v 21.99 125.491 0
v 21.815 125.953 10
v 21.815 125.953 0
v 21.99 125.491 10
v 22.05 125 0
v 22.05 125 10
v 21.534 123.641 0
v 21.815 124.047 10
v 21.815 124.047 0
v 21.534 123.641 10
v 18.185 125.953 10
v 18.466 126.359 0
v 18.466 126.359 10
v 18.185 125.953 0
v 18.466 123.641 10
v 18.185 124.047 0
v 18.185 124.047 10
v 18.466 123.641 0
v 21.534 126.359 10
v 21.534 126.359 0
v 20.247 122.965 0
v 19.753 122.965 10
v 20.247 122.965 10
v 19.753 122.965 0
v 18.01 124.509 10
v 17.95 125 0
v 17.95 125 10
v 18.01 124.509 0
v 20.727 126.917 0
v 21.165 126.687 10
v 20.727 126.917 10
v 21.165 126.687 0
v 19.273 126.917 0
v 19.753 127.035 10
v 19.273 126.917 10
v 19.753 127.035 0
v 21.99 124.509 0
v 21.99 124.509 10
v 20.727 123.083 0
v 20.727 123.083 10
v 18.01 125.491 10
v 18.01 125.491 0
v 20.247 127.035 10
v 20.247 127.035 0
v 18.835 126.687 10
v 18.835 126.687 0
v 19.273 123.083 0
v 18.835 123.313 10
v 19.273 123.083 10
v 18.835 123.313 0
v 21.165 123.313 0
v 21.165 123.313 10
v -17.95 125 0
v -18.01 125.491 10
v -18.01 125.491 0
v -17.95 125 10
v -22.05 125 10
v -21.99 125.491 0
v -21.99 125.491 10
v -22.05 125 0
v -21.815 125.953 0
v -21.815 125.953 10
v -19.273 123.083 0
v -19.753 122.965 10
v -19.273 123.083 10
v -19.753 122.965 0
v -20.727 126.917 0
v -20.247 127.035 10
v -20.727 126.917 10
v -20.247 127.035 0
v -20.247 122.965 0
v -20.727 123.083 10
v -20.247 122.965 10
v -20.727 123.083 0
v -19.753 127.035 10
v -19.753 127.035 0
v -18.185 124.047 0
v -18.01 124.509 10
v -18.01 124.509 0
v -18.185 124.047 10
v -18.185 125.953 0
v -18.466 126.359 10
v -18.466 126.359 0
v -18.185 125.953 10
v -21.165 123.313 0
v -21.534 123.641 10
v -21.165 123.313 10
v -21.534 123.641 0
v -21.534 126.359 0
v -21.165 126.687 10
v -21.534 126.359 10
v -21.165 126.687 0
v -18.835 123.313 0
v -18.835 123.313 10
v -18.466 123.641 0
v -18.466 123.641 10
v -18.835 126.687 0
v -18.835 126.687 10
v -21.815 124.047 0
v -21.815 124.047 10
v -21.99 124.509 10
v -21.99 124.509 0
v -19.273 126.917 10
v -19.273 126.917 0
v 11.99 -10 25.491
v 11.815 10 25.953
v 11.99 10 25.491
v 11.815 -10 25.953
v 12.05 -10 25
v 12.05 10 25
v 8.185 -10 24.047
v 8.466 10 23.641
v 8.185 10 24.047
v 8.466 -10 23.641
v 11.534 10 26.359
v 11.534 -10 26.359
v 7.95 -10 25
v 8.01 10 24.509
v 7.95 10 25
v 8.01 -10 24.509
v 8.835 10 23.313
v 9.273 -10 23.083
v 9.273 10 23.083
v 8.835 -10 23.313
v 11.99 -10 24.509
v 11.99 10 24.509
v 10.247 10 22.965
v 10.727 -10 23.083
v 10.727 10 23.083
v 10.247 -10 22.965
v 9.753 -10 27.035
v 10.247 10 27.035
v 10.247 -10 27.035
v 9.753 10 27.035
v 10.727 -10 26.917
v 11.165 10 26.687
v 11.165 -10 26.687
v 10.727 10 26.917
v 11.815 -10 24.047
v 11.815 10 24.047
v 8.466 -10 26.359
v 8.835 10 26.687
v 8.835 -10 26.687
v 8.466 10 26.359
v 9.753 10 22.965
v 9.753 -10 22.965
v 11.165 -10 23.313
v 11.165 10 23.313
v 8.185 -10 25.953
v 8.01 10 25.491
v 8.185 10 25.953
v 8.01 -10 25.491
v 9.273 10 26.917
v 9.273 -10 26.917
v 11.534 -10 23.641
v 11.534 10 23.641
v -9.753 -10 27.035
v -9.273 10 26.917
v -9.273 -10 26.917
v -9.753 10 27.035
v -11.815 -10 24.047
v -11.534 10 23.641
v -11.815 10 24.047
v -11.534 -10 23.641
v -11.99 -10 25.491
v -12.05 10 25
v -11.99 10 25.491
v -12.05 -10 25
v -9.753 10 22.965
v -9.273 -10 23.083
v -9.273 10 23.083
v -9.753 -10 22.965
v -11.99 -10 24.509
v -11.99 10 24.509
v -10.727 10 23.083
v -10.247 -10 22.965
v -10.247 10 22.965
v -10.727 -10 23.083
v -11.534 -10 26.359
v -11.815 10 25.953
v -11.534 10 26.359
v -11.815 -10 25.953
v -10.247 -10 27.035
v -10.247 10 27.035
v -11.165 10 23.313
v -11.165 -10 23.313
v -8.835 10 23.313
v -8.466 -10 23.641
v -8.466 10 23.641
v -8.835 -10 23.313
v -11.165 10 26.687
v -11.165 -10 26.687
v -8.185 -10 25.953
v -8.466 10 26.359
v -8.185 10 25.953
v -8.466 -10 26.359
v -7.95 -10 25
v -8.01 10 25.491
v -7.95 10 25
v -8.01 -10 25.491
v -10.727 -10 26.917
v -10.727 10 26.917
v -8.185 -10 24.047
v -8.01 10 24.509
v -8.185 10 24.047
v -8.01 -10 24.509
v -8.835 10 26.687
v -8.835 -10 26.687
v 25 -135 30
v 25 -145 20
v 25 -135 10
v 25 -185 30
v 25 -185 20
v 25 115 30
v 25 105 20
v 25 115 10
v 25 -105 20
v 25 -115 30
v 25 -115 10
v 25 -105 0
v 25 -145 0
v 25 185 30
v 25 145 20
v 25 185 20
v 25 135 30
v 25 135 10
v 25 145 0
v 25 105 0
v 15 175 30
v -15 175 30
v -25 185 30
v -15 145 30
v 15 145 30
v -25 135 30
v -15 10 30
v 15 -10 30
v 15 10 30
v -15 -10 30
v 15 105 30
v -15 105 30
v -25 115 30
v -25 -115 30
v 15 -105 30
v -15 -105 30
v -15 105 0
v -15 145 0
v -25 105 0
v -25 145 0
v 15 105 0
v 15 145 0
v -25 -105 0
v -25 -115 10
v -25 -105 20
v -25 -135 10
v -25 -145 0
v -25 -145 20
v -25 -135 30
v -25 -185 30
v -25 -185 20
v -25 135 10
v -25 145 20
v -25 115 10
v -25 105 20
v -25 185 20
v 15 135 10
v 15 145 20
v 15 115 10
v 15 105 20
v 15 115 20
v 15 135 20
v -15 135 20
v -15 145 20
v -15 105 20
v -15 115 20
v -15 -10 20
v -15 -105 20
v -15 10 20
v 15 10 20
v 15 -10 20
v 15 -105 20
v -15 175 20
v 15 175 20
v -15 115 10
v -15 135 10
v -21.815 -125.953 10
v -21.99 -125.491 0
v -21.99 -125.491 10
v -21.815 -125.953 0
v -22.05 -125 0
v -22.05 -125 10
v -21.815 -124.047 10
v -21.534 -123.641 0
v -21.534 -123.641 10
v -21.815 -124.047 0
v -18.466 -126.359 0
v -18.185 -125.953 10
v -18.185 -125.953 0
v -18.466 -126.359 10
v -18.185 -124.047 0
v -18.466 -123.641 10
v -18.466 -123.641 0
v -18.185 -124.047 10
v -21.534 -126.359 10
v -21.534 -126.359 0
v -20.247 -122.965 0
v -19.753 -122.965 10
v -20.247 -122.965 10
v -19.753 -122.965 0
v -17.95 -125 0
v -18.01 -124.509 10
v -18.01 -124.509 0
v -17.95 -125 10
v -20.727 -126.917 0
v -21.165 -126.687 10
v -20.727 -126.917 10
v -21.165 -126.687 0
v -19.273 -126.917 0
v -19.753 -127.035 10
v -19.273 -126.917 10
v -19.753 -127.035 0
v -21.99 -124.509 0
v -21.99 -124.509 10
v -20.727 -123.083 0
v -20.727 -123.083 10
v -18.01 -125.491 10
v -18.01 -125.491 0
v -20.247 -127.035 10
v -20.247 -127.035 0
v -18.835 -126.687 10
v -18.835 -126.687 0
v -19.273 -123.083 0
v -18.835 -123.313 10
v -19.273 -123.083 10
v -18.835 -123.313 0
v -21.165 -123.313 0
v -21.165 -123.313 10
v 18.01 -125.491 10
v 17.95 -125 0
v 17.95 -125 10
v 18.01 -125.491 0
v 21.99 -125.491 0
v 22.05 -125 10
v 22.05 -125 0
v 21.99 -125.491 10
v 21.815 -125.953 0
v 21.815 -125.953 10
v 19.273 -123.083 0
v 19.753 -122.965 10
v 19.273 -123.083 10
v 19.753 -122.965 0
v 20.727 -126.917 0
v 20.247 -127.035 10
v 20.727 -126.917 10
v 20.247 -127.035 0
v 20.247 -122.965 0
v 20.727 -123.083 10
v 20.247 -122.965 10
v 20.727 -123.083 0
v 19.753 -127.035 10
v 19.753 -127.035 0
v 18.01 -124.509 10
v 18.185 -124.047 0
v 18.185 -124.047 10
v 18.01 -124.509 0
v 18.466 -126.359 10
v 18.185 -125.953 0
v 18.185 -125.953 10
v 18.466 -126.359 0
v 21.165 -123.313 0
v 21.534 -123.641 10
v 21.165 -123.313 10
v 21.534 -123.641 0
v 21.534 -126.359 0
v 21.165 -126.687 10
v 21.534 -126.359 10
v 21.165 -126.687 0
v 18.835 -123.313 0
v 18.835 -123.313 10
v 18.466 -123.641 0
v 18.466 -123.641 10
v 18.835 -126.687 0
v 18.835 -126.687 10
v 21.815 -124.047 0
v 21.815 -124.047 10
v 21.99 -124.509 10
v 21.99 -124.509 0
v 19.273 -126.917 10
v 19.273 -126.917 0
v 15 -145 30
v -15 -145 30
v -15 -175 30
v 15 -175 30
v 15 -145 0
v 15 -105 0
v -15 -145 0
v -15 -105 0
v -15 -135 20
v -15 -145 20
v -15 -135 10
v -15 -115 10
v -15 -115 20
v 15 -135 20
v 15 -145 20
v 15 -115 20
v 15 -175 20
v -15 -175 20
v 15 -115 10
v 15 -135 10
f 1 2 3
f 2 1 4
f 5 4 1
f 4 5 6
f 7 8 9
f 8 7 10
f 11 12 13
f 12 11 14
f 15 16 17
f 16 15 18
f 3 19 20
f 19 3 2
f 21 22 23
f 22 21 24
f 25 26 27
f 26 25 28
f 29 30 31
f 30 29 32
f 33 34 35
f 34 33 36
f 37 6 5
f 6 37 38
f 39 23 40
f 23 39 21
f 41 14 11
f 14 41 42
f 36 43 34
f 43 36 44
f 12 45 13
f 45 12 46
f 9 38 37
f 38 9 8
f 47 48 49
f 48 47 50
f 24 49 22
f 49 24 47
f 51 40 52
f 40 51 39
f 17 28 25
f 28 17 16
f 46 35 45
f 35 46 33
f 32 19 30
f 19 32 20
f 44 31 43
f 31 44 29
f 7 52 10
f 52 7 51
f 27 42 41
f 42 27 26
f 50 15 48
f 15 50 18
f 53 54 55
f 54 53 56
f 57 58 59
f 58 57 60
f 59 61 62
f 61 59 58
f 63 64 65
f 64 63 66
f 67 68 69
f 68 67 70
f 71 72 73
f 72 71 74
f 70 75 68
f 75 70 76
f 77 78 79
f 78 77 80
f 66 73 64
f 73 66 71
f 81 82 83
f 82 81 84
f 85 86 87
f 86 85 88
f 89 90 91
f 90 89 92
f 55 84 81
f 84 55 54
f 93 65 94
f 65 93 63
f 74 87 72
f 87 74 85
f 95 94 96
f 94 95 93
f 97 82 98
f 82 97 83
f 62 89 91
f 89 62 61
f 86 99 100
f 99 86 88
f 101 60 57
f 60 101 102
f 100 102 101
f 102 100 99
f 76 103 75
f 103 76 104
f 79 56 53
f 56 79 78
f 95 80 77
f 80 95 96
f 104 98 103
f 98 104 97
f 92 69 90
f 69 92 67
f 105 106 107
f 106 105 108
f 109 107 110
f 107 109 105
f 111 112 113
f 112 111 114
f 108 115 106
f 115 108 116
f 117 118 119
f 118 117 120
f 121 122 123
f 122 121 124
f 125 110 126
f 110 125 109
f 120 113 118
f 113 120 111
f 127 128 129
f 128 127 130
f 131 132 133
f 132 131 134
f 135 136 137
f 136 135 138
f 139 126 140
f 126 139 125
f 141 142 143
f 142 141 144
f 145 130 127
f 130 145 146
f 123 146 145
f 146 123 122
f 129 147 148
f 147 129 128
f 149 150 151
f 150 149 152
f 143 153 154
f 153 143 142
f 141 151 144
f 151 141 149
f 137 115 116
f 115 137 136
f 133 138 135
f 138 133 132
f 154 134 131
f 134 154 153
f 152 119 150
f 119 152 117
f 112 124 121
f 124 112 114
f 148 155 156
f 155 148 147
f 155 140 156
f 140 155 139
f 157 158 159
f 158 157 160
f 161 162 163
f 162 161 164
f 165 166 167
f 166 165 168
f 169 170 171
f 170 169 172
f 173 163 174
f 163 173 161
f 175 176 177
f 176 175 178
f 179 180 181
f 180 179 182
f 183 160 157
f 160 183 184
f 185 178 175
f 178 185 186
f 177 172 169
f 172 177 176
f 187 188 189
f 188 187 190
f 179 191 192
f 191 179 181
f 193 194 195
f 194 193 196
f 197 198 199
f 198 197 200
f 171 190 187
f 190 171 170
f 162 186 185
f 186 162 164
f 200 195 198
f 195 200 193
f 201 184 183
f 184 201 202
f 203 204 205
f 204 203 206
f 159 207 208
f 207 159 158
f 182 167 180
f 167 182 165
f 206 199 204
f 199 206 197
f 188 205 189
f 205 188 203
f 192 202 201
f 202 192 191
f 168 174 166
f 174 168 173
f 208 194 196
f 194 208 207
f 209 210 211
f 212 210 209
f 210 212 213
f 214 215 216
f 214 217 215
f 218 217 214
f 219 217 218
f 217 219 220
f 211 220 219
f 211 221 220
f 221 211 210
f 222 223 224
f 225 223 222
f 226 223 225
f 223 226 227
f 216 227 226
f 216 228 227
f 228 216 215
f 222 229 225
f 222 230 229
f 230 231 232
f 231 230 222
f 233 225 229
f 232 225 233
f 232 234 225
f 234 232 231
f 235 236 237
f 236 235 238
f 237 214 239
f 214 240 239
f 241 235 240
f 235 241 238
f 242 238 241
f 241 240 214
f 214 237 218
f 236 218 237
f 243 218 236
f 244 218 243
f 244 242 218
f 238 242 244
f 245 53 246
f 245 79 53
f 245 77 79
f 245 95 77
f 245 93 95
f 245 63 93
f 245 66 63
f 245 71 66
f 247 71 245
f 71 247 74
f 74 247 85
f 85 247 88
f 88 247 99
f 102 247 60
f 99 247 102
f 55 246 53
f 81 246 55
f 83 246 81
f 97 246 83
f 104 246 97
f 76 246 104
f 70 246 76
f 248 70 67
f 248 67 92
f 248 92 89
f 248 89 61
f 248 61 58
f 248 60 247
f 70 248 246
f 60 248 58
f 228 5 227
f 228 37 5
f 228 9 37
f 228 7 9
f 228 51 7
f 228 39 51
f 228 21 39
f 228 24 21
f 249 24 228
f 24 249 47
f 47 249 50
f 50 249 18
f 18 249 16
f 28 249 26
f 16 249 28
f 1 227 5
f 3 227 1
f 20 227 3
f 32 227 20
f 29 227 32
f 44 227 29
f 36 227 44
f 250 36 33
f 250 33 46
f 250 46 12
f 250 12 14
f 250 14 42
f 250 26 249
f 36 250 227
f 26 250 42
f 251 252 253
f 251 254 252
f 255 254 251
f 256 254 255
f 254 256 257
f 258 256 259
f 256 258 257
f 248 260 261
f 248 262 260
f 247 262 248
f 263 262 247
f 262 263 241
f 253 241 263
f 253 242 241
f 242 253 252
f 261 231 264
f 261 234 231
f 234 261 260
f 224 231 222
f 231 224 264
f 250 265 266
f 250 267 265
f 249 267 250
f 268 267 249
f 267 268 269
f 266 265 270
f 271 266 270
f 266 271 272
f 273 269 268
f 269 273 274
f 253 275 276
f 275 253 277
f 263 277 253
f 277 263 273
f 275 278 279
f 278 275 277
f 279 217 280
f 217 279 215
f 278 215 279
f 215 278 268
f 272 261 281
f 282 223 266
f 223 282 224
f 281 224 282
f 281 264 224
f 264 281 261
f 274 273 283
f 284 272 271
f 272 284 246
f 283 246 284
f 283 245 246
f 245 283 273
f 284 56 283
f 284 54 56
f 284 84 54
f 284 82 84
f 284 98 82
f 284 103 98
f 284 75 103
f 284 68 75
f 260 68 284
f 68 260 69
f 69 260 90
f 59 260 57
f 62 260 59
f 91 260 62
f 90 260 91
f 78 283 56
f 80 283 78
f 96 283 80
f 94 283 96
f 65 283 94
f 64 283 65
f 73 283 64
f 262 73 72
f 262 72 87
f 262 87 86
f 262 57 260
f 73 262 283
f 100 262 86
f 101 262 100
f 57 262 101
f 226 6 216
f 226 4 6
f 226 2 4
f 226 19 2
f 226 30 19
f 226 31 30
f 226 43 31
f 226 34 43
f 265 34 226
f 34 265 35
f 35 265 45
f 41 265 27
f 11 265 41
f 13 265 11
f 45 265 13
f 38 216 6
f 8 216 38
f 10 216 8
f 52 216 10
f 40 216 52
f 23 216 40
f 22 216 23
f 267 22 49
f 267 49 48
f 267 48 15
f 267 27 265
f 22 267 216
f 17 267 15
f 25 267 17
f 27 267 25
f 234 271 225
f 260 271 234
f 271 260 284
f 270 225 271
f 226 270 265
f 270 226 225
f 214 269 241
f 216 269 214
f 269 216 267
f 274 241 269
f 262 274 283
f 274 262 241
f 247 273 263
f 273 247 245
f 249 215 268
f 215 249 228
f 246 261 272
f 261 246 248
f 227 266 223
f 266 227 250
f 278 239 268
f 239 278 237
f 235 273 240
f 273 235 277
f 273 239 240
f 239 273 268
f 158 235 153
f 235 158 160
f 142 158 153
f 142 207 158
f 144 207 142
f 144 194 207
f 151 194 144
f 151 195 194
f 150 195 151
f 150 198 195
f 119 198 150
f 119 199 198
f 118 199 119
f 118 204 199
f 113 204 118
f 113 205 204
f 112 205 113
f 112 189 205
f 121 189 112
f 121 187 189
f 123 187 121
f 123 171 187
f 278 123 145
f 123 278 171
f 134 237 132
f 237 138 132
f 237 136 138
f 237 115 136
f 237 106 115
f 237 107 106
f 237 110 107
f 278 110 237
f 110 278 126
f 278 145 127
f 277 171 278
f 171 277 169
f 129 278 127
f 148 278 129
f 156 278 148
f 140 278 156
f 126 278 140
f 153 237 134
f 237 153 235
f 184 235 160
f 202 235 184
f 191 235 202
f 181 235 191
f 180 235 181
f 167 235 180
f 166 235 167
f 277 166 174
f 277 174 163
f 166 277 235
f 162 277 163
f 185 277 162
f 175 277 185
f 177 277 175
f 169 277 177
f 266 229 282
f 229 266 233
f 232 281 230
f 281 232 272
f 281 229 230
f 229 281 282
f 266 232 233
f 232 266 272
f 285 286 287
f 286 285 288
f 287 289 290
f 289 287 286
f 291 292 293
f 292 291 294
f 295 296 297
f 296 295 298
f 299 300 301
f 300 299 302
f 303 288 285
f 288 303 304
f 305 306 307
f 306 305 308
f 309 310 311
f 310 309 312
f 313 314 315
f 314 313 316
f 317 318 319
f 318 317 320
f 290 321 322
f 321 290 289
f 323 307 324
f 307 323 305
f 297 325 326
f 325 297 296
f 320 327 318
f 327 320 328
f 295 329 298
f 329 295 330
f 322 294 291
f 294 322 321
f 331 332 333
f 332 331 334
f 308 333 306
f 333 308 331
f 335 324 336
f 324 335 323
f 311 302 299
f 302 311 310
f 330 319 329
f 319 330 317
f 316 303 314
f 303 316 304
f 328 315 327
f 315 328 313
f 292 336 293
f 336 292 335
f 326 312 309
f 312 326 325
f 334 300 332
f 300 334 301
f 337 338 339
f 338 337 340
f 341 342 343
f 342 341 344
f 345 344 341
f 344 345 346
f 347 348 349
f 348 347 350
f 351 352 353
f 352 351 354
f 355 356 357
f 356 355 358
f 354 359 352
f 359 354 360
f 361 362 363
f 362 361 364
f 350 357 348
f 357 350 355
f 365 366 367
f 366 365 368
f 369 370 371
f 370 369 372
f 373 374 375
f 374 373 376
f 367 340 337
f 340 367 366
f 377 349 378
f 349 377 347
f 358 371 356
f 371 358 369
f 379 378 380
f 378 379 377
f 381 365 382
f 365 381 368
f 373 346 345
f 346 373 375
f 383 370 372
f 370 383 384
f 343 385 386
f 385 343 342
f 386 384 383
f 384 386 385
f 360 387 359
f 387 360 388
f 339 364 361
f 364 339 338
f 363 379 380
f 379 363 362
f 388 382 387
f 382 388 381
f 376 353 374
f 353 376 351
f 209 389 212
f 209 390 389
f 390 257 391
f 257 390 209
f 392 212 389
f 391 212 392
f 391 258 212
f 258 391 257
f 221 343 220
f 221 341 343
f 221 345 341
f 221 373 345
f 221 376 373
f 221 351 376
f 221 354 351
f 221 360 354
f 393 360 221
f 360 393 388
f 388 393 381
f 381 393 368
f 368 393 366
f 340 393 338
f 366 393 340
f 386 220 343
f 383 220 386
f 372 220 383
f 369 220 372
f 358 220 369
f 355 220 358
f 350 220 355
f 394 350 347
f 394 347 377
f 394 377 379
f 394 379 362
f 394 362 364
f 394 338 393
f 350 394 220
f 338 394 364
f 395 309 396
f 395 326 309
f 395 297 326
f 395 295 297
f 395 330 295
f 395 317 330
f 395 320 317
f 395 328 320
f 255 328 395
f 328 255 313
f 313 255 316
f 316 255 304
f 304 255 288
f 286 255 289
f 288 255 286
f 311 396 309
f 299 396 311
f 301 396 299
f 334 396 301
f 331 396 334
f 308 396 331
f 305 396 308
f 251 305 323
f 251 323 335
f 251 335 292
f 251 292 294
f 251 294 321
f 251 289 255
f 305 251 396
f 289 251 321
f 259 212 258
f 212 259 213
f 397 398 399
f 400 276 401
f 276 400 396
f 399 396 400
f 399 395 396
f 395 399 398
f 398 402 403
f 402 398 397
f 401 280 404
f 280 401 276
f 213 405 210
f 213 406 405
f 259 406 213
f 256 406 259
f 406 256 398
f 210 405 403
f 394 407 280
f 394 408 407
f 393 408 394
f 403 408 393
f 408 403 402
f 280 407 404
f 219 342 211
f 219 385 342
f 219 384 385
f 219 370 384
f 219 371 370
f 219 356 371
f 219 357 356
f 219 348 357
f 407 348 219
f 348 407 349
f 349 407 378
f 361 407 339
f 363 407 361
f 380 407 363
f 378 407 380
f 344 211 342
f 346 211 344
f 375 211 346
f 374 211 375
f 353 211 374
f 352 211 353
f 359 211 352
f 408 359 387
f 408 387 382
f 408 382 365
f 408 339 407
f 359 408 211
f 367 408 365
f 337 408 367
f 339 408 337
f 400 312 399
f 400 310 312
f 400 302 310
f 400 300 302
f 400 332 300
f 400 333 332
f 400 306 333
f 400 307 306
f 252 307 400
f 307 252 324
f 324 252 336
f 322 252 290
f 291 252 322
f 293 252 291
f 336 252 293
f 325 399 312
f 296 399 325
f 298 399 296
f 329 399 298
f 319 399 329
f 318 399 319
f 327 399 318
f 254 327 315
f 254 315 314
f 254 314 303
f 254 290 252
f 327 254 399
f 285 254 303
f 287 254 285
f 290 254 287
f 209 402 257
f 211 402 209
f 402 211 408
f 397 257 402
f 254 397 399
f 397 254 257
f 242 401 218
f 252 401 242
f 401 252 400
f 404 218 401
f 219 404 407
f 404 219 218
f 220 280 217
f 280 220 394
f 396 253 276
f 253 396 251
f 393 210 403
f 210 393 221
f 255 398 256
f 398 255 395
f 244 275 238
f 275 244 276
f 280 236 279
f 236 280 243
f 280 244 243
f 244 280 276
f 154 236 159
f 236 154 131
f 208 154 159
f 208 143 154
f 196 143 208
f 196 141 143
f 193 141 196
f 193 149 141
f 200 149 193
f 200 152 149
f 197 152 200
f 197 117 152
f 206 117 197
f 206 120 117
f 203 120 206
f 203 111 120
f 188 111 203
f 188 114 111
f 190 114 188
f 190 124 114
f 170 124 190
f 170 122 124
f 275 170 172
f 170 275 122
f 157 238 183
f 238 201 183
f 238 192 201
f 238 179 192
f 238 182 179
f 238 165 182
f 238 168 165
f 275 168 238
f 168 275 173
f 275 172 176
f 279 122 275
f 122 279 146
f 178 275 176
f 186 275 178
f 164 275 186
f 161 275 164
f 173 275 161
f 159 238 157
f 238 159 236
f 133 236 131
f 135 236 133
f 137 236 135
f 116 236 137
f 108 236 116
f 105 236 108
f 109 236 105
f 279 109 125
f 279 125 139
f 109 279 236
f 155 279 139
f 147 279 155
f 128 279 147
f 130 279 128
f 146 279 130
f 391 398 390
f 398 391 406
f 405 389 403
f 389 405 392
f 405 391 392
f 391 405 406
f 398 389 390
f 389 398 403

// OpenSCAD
// file: copy.scad
// this file defines various copy functions


// this function copies his children and rotates the copies

// v: rotation vector
// n: number of copies
// center: rotate on both sides equally
module rotateCopy(v = [0,0,0], n = 1, center = false)
{
  // calculate rotation offset if center is true
  rotationOffset = -n*v/2;
  
  // copy rotate
  for (i = [0:n])
  {
    if (center)
    {
      rotate(i*v + rotationOffset) children();
    }
    else
    { 
      rotate(i*v) children();
    }
  }
}


// this function copies his children and translates the copies

// v: translation vector
// n: number of copies
// center: translate on both sides equally
module translateCopy(v = [0,0,0], n = 1, center = false)
{
  // calculate translation offset if center is true
  translationOffset = -n*v/2;
  
  // copy and translate
  for (i = [0:n])
  {
    if (center) 
    {
      translate(i*v + start) children();
    }
    else 
    {
      translate(i*v) children();
    }
  }
}


// this function copies his children and mirrors the copy

// v: mirror vector
module mirrorCopy(v = [1,0,0])
{
  children();
  mirror(v) children();
}


// this function copies his children in a grid
// translation, size and centering can be set for each dimension x,y,z

// v: translation vector
// size: size of grid
// center: translate on both sides equally
module linearGrid(v = [0,0,0], size = [1,1,1], center = [false,false,false])
{
  if (is_num(v))
  {
    // expand v to 3 dimensions
    linearGrid([v,v,v], size, center) children();
  }
  else if (is_num(size))
  {
    // expand size to 3 dimensions
    linearGrid(v, [size,size,size], center) children();
  }
  else if (is_num(center))
  {
    // expand center to 3 dimensions
    linearGrid(v, size, [center,center,center]) children();
  }
  else
  {
    translateCopy([1,0,0]*v[0], size[0]-1, center[0])
    translateCopy([0,1,0]*v[1], size[1]-1, center[1])
    translateCopy([0,0,1]*v[2], size[2]-1, center[2])
      children();
  }
}
// main file
// this file defines the truck frame
$fa = 5;
$fs = 0.5;


// used modules
use <copy.scad>


// shows truck frame
frame();


// truck frame
module frame()
{
  // put two halfs together
  rotateCopy([0,0,180]) frameHalf();
}


// truck frame half
module frameHalf()
{
  difference()
  {
    // basic frame
    translate([0,92.5,15]) cube([50,185,30], center = true);
    
    // remove unused inside
    translate([0,95,5]) cube([30,195,30], center = true);
    
    // shape frame
    translate([0,125,21]) cube([60,20,22], center = true);
    translate([0,52,9]) cube([60,106,22], center = true);
    translate([0,170,9]) cube([60,50,22], center = true);
    
    // remove unused material on shaped frame
    translate([0,57.5,25]) cube([30,95,15], center = true);
    translate([0,160,25]) cube([30,30,15], center = true);
    
    // add holes to mount axles
    mirrorCopy([1,0,0]) translate([20,125,-5]) cylinder(d = 4.1, h = 30);
    
    // add holes to put halfs together
    mirrorCopy([1,0,0]) translate([10,5,25]) rotate([90,0,0]) cylinder(d = 4.1, h = 15, center = true);
  } 
}
